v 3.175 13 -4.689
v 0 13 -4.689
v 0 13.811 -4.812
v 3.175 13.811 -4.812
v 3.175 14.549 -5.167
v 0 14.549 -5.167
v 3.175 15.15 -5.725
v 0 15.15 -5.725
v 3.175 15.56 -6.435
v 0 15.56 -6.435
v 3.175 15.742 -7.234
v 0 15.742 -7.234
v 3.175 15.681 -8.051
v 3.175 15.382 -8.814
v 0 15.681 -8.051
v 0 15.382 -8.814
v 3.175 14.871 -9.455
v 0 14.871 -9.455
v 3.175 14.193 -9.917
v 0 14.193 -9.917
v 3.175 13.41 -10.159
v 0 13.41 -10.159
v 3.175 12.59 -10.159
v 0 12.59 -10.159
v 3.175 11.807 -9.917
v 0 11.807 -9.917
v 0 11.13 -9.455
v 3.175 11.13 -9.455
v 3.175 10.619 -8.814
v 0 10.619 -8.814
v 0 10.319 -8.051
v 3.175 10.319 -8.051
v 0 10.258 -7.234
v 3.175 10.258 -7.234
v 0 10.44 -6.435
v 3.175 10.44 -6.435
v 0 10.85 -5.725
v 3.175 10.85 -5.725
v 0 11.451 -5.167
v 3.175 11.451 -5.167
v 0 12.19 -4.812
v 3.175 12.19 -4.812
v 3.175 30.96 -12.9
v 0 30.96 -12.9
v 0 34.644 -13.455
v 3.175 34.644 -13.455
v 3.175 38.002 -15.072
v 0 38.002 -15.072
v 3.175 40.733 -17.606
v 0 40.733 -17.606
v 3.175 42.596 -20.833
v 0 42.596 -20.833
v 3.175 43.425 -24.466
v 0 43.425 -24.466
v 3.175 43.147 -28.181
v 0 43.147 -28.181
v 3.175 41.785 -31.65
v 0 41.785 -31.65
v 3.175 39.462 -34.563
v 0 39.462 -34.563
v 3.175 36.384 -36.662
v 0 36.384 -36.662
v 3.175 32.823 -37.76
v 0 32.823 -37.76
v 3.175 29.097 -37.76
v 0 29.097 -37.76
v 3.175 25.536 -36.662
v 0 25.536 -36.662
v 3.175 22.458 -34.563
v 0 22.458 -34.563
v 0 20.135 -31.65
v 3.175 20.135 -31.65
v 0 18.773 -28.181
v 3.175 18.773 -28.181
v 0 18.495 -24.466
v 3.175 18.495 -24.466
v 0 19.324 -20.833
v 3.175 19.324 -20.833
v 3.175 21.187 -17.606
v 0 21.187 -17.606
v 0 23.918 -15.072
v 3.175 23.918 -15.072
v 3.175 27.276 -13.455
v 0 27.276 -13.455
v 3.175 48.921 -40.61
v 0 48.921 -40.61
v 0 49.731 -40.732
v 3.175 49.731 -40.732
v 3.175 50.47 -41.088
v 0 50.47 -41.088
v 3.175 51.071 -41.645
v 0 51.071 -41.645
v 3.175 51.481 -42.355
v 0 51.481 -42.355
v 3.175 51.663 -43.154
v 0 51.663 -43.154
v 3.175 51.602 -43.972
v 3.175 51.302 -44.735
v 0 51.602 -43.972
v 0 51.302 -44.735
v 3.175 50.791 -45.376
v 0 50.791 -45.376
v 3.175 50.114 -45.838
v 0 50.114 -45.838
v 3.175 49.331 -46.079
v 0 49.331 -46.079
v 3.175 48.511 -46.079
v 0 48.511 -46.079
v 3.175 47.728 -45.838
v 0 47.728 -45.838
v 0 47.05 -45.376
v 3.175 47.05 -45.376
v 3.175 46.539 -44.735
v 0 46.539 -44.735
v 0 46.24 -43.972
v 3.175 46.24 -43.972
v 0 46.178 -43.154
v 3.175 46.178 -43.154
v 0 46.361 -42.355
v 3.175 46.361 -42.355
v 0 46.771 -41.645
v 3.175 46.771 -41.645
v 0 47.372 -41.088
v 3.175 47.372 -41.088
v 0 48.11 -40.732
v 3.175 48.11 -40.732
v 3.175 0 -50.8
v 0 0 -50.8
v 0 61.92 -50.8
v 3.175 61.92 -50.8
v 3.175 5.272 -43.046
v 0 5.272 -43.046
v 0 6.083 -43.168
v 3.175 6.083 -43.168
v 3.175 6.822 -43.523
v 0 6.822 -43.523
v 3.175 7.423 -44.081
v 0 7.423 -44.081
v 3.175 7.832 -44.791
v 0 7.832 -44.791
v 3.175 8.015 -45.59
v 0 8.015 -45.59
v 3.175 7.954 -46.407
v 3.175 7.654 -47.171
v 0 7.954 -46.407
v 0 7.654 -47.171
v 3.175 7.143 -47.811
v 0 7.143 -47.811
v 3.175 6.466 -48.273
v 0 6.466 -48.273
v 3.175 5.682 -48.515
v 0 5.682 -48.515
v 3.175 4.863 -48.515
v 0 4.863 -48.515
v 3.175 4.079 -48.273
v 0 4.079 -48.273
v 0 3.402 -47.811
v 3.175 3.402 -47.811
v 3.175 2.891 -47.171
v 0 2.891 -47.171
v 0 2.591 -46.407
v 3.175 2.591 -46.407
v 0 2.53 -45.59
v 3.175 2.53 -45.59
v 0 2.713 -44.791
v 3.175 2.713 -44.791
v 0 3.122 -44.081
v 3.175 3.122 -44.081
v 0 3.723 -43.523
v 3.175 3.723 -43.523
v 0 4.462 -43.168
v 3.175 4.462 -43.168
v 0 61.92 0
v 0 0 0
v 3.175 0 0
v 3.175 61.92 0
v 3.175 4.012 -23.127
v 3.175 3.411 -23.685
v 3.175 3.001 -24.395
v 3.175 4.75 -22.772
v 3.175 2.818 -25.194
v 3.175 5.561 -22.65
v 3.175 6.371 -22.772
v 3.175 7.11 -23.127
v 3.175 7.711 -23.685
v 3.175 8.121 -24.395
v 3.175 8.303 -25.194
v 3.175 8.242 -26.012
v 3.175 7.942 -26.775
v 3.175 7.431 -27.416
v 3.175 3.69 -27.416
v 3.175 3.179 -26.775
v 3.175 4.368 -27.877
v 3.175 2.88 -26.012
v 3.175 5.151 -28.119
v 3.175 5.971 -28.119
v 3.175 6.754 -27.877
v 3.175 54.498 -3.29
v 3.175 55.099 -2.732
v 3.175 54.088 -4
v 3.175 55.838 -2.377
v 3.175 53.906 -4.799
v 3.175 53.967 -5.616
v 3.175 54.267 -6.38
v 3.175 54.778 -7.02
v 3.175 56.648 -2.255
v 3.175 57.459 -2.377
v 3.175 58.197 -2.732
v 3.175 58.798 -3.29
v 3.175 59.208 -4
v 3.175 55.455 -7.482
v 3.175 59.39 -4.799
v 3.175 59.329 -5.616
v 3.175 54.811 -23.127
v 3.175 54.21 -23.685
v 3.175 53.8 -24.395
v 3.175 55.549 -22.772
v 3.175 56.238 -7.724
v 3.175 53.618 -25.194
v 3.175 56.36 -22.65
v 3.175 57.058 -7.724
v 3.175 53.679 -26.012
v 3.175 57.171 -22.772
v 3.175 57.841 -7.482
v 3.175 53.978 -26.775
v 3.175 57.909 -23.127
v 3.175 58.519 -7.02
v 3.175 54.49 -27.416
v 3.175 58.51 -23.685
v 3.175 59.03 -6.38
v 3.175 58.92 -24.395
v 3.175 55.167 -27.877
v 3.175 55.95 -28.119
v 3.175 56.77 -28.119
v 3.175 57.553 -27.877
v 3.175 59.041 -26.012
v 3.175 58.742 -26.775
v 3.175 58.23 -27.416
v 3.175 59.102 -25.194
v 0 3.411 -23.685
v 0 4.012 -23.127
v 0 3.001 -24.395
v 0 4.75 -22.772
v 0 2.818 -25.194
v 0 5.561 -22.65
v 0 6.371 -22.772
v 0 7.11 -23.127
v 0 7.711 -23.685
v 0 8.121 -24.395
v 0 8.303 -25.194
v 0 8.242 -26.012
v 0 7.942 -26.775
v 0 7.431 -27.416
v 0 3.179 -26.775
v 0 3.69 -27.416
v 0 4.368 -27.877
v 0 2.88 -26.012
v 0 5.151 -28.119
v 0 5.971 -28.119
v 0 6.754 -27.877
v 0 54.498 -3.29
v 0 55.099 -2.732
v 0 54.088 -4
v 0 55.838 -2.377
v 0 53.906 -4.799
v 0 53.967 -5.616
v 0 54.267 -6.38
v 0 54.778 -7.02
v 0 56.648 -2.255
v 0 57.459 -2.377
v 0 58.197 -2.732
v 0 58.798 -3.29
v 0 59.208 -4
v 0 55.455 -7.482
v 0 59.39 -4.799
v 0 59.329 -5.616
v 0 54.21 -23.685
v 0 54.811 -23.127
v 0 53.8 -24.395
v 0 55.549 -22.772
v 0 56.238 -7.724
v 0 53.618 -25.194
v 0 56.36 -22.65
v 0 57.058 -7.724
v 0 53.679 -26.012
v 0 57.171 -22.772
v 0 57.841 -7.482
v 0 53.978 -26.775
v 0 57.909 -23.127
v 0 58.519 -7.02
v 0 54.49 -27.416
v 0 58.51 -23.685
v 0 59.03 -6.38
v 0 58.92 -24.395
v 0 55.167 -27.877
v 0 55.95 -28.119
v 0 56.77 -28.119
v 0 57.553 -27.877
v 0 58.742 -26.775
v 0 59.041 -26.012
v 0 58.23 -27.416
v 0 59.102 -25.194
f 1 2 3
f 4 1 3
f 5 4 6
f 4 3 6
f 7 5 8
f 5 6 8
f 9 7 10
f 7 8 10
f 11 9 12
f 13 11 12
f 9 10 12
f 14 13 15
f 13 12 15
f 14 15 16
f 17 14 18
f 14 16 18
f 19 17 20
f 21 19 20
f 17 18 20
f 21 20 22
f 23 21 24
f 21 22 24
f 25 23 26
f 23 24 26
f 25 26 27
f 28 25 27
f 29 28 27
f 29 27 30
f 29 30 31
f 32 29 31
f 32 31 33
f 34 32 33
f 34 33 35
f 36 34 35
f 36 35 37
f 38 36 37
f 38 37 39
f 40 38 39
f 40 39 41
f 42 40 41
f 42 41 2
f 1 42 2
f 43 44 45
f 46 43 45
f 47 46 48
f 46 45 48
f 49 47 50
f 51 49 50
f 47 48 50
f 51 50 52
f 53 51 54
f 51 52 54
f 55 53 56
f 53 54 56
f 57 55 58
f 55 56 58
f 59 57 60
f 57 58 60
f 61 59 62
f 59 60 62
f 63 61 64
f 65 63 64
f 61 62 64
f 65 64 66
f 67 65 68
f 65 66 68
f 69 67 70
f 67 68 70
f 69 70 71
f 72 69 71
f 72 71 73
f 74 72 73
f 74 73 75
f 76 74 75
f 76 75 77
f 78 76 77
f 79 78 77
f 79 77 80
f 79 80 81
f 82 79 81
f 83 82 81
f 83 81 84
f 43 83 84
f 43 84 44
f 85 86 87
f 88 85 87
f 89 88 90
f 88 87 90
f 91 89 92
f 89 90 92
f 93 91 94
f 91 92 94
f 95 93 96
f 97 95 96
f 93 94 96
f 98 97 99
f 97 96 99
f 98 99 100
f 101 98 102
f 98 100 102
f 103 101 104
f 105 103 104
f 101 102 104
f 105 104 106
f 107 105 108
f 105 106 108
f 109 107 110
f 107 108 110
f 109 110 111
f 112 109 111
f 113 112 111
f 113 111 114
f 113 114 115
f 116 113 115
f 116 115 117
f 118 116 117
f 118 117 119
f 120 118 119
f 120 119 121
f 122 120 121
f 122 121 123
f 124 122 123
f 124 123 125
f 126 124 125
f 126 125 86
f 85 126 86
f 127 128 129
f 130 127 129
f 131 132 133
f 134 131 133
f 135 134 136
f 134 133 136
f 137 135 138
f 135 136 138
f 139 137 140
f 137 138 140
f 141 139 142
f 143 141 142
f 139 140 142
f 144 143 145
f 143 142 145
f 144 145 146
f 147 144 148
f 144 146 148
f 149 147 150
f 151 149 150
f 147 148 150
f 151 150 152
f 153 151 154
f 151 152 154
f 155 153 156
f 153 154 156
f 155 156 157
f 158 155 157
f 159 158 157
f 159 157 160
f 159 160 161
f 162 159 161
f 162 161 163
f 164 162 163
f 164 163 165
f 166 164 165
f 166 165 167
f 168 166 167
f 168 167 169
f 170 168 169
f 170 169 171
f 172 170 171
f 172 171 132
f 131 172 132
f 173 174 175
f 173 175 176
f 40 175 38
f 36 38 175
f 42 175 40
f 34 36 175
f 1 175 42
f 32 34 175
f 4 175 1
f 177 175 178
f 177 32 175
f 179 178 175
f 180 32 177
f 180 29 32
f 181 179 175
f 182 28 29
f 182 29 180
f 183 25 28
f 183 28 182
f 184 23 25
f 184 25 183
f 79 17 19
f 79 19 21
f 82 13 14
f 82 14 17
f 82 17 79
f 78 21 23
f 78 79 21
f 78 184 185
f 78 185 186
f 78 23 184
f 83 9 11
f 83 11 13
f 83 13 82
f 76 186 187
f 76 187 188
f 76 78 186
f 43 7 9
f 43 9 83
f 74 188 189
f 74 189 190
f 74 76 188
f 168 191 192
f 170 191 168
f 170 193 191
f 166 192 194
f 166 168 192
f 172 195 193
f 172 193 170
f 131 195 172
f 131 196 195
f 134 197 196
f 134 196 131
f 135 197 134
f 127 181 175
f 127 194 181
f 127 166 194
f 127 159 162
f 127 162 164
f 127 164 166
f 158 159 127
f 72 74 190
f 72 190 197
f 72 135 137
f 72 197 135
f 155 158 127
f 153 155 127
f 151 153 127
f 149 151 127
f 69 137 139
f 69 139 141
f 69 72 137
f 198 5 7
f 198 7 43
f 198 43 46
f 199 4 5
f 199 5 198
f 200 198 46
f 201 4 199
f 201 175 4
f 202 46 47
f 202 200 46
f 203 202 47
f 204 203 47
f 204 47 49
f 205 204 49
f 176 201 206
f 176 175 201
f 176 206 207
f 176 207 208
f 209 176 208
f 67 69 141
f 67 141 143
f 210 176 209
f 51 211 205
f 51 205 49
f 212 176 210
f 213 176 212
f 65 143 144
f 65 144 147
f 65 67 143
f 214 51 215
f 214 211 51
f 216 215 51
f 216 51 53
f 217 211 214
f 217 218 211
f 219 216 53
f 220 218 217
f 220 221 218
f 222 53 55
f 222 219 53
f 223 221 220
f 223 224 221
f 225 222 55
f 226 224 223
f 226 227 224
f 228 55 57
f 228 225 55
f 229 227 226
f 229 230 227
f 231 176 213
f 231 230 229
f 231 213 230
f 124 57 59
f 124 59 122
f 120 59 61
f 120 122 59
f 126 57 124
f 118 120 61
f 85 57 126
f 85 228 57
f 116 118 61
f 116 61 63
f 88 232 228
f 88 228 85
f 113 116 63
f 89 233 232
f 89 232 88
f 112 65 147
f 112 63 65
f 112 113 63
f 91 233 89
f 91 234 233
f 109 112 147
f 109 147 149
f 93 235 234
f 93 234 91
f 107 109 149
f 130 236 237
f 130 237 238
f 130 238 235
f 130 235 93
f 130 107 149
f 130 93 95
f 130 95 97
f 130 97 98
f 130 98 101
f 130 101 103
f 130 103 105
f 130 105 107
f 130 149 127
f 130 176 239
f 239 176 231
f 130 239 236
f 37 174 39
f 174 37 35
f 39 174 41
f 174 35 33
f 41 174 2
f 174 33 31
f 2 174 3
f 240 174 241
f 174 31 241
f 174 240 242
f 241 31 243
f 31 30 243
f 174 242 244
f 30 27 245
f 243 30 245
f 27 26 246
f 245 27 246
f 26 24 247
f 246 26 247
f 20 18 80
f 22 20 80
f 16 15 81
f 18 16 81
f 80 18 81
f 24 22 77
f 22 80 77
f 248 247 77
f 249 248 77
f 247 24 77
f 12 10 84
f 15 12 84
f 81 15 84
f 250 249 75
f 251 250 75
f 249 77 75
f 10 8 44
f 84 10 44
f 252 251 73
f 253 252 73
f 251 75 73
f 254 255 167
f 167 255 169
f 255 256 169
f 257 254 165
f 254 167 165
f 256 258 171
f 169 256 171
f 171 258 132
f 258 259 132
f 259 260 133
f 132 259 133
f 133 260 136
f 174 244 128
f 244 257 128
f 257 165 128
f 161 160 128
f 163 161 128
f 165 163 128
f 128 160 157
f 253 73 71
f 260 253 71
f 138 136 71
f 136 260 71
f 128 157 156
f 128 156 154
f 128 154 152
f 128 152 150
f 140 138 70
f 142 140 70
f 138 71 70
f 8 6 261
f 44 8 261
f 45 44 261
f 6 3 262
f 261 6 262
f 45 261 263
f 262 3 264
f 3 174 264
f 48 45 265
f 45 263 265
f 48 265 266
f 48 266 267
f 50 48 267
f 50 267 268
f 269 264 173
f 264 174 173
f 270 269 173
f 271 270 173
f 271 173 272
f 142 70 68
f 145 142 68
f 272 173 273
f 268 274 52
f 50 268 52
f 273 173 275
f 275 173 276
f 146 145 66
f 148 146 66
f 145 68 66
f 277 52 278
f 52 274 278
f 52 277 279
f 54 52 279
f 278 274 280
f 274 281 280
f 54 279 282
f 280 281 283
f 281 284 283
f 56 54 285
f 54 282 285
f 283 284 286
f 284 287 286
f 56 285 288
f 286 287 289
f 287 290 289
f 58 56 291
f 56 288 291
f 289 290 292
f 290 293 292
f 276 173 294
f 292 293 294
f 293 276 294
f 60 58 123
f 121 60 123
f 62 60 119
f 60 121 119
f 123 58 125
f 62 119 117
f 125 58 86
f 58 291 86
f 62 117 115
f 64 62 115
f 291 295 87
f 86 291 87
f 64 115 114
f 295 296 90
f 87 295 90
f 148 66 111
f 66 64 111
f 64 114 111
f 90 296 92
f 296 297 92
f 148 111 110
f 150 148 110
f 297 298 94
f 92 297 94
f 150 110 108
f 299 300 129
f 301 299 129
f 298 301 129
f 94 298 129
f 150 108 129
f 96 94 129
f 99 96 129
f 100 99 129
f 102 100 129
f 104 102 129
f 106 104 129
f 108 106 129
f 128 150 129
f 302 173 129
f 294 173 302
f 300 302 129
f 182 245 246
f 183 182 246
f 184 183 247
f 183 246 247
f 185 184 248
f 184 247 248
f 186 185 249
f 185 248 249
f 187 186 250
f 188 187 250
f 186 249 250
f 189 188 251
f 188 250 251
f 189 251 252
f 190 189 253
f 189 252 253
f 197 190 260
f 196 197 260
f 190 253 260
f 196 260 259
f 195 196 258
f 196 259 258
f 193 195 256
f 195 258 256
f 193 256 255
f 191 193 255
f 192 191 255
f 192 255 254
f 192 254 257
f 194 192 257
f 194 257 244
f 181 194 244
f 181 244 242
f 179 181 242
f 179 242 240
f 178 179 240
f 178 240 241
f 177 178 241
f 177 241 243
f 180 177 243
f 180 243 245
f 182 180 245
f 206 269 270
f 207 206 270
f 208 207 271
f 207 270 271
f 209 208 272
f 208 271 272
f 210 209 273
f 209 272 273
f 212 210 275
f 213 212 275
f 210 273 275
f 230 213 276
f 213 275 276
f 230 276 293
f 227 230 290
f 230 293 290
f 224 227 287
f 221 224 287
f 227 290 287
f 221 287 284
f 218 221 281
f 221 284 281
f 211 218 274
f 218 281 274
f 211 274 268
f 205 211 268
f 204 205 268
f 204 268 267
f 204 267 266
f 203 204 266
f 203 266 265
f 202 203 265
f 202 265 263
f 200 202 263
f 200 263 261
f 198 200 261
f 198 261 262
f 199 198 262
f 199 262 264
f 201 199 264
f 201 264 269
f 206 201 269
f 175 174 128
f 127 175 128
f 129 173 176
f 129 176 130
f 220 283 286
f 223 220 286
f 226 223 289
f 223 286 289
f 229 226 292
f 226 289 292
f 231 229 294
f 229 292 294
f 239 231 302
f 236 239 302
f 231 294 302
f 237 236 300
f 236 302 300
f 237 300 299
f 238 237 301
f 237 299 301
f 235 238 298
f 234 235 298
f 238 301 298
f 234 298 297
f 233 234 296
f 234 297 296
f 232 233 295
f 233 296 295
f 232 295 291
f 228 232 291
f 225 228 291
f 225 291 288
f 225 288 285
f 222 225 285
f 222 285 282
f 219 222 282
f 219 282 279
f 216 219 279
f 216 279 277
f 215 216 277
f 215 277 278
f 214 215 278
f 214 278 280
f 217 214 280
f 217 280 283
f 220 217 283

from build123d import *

# Parameters (mm, degrees)
SKETCH1_W           = 50.8
SKETCH1_H           = 61.92
BOSS_EXTRUDE2_DEPTH = 3.175
SKETCH2_R           = 12.5
SKETCH2_R_2         = 2.75
CUT_EXTRUDE1_DEPTH  = 4.175


with BuildPart() as part:
    # Sketch1 → Boss-Extrude2 (new body)
    with BuildSketch(Plane(origin=(0, 0, 0), x_dir=(0, 0, -1), z_dir=(1, 0, 0))):
        with Locations((25.4, 30.96)):
            Rectangle(SKETCH1_W, SKETCH1_H)
    extrude(amount=BOSS_EXTRUDE2_DEPTH)

    # Sketch2 → Cut-Extrude1 (cut, through all)
    with BuildSketch(Plane.ZY):
        with Locations((-25.399655405, 30.96)):
            Circle(SKETCH2_R)
        with Locations((-43.35992398, 48.920755906)):
            Circle(SKETCH2_R_2)
        with Locations((-25.399655405, 56.36)):
            Circle(SKETCH2_R_2)
        with Locations((-5.004504526, 56.648087135)):
            Circle(SKETCH2_R_2)
        with Locations((-25.399655405, 5.560695)):
            Circle(SKETCH2_R_2)
        with Locations((-45.795509398, 5.272471121)):
            Circle(SKETCH2_R_2)
        with Locations((-7.439487758, 13.000182758)):
            Circle(SKETCH2_R_2)
    extrude(amount=-CUT_EXTRUDE1_DEPTH, mode=Mode.SUBTRACT)


solid = part.part
